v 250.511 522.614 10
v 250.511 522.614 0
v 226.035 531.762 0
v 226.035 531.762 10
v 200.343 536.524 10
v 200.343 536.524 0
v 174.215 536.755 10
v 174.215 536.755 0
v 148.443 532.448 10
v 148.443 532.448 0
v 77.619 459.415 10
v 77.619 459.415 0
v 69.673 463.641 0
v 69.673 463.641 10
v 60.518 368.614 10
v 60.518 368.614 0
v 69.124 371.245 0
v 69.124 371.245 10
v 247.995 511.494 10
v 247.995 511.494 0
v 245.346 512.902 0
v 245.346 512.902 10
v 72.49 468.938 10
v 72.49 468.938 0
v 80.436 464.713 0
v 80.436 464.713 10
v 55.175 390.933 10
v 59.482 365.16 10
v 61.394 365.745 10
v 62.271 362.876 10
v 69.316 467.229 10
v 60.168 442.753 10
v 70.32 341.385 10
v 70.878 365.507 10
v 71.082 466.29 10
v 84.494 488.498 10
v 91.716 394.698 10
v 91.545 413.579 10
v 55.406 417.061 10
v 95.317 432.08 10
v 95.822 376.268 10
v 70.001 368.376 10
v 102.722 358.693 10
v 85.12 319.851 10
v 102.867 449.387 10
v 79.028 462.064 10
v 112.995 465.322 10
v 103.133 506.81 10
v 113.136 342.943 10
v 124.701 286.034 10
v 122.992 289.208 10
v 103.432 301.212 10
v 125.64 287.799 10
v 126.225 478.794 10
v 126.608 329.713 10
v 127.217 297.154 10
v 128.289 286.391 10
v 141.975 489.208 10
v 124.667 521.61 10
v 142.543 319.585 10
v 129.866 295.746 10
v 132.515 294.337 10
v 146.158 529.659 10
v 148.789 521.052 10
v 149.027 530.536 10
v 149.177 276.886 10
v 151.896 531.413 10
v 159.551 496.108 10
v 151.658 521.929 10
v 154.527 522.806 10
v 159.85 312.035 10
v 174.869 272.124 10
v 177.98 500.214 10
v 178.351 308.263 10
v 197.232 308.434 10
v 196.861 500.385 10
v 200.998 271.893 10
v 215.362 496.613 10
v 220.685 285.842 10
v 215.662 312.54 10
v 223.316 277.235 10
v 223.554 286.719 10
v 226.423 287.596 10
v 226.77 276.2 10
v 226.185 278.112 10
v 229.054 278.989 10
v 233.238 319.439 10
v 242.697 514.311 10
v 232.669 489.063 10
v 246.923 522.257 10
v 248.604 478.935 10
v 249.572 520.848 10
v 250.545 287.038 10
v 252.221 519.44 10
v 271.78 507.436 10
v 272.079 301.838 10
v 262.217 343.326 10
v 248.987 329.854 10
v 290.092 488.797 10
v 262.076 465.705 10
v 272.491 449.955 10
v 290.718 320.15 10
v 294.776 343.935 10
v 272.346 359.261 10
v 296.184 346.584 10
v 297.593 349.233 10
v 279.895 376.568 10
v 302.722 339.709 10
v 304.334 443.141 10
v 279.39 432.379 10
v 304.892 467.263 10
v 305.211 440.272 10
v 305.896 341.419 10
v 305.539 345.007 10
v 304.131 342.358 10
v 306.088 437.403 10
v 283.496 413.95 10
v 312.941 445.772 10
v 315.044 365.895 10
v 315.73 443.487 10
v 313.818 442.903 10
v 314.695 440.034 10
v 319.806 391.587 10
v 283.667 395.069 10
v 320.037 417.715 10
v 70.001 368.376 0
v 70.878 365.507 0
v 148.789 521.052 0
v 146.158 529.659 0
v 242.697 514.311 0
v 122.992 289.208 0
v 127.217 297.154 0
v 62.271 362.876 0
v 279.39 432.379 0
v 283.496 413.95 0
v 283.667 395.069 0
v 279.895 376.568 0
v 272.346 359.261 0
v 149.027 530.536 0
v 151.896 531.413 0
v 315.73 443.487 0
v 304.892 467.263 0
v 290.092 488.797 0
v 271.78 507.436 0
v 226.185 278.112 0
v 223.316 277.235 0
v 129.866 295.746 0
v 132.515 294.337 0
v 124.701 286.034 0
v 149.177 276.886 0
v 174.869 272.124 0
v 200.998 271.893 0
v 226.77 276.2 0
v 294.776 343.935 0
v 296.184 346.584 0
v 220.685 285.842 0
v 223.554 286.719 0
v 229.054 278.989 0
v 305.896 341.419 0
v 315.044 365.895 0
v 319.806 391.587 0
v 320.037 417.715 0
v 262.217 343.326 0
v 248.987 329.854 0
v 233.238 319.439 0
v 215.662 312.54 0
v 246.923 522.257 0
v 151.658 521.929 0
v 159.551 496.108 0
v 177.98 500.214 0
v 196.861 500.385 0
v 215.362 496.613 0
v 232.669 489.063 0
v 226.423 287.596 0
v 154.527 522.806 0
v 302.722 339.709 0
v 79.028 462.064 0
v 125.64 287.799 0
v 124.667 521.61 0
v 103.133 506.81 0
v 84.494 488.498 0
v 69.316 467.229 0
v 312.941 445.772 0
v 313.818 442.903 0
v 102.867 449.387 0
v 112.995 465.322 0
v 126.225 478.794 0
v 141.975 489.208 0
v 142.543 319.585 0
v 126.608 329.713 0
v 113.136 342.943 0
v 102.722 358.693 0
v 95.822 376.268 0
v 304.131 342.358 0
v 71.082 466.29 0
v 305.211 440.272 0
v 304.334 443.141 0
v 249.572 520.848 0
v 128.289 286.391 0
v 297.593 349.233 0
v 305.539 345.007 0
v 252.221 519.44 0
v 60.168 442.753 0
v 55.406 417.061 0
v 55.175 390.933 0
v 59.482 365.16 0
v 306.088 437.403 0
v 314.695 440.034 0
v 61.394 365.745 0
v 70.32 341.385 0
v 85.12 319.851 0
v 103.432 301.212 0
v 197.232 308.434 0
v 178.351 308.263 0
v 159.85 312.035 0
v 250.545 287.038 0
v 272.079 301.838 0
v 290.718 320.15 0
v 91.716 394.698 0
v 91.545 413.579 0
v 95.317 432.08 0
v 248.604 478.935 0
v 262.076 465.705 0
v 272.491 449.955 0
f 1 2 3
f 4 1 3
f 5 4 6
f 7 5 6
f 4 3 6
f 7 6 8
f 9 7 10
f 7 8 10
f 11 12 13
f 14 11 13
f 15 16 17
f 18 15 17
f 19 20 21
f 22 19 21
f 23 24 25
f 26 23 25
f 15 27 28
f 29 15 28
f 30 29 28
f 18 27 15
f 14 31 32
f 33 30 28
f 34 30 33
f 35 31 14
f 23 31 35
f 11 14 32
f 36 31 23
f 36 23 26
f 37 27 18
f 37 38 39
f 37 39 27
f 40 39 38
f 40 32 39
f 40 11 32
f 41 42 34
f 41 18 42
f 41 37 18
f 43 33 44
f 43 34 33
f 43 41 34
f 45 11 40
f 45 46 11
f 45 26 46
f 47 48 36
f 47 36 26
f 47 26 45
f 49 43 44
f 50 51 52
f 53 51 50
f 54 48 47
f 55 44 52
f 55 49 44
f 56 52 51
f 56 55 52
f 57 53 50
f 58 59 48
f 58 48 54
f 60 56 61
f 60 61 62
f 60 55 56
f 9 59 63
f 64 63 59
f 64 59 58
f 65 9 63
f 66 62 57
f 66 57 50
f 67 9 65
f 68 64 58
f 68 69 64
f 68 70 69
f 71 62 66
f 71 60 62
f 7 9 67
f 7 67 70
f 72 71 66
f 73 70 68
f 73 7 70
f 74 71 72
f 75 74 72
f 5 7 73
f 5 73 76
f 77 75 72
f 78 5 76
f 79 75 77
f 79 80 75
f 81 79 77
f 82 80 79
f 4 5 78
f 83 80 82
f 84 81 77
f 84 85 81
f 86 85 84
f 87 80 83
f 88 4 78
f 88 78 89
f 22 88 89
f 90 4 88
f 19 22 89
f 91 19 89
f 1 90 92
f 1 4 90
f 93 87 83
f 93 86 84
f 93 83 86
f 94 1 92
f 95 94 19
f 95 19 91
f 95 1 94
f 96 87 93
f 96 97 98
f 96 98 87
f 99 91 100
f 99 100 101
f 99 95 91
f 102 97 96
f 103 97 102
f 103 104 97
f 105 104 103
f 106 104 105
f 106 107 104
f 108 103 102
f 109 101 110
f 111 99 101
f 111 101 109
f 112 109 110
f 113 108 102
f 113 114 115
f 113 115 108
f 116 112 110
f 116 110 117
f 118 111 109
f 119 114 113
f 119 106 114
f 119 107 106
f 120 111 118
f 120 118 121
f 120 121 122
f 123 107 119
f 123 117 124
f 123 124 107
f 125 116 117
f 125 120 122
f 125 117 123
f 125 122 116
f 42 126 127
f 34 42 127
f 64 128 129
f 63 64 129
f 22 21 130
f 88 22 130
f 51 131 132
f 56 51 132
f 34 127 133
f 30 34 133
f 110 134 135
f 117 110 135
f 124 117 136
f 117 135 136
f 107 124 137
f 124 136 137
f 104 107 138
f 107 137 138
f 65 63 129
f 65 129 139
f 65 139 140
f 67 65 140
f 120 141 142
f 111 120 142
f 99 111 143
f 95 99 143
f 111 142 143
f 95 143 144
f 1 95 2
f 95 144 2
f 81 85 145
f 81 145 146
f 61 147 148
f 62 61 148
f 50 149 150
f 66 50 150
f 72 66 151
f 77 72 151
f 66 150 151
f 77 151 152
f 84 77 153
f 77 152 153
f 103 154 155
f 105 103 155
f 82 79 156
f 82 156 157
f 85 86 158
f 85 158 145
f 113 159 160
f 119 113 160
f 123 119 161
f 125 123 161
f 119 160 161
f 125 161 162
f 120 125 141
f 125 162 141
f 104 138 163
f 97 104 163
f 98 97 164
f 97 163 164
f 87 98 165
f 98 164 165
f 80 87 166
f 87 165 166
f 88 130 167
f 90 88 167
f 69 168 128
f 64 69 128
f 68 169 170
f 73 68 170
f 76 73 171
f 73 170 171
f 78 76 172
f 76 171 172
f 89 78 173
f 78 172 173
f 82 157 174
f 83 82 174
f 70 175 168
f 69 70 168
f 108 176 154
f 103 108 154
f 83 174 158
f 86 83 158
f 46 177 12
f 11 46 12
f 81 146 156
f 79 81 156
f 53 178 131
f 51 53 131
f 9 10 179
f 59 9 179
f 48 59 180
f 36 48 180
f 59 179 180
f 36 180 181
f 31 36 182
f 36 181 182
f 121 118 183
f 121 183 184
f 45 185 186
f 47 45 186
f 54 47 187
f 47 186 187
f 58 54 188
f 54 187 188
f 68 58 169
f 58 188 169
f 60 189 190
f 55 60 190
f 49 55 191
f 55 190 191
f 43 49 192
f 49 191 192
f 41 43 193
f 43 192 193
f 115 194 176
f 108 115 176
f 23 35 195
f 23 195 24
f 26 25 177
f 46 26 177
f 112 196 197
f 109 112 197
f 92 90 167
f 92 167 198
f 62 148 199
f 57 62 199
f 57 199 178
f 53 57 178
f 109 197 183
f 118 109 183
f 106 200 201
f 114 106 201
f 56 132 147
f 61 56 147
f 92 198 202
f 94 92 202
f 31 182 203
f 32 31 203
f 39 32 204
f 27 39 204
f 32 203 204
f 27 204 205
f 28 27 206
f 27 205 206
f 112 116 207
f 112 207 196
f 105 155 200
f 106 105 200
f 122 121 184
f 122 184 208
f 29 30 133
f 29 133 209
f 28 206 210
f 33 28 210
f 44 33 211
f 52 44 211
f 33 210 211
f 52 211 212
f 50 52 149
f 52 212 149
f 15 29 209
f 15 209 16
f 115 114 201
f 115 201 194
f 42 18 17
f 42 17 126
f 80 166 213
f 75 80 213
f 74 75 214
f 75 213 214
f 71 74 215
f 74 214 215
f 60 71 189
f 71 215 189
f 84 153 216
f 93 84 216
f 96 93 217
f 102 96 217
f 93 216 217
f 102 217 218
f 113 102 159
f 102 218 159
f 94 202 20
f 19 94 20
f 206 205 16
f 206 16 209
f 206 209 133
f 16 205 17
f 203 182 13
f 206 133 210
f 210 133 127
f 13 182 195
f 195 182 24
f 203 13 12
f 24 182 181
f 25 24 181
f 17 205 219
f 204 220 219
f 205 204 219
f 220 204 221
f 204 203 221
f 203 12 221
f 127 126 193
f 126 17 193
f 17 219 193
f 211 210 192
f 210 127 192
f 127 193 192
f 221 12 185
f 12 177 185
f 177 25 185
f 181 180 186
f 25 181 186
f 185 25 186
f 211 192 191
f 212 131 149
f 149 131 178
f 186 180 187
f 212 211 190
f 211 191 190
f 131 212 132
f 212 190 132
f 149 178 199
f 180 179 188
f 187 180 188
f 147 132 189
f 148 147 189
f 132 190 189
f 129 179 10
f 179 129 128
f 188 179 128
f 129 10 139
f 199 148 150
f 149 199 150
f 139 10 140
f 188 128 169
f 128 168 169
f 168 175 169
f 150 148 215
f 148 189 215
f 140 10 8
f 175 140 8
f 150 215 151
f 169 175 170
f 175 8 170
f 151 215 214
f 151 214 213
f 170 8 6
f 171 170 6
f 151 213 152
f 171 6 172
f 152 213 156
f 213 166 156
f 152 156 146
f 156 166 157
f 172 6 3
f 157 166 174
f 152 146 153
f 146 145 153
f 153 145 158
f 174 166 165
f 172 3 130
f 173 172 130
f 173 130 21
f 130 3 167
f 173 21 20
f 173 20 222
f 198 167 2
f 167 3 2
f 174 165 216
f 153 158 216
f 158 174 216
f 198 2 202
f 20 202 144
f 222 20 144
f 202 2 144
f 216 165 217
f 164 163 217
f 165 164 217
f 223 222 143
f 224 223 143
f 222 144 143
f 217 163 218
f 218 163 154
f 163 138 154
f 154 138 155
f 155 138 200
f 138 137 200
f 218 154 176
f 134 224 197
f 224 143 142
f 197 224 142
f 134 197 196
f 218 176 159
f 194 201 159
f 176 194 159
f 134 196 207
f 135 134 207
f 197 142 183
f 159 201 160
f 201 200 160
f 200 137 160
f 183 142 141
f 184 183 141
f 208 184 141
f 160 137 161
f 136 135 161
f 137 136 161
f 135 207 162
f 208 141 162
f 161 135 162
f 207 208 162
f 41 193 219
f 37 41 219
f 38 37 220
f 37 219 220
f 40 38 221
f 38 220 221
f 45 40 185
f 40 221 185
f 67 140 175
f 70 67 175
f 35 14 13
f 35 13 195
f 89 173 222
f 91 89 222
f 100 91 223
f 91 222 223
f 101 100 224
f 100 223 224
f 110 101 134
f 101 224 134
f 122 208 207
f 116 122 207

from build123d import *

# Parameters (mm, degrees)
EXTRUDE_1_DEPTH          = 10
PATTERN_CIRCULAR_1_COUNT = 8


with BuildPart() as part:
    # 草图1 → 凸台-拉伸1 (new body)
    with BuildSketch(Plane.XY):
        with BuildLine():
            Line((142.543194713, 319.58457711), (129.866098291, 295.745717525))
            Line((129.866098291, 295.745717525), (132.514860467, 294.337151256))
            Line((132.514860467, 294.337151256), (128.28916166, 286.390864728))
            Line((128.28916166, 286.390864728), (125.640399483, 287.799430997))
            Line((125.640399483, 287.799430997), (124.701355304, 286.033589546))
            ThreePointArc((124.701355304, 286.033589546), (174.869094963, 272.123990236), (226.769655421, 276.199634915))
            Line((226.769655421, 276.199634915), (226.185021463, 278.112277886))
            Line((226.185021463, 278.112277886), (223.316057006, 277.23532695))
            Line((223.316057006, 277.23532695), (220.685204199, 285.842220321))
            Line((220.685204199, 285.842220321), (223.554168656, 286.719171257))
            Line((223.554168656, 286.719171257), (215.661610233, 312.539851371))
            ThreePointArc((215.661610233, 312.539851371), (178.350963885, 308.262904384), (142.543194713, 319.58457711))
        make_face()
    extrude_1 = extrude(amount=EXTRUDE_1_DEPTH)

    # 阵列(圆周)1: 凸台-拉伸1 ×8 about axis
    pattern_circular_1_axis = Axis((187.606138684, 404.323949445, 10), (0, 0, -1))
    for i in range(1, PATTERN_CIRCULAR_1_COUNT):
        add(extrude_1.rotate(pattern_circular_1_axis, i * 360 / PATTERN_CIRCULAR_1_COUNT))


solid = part.part
